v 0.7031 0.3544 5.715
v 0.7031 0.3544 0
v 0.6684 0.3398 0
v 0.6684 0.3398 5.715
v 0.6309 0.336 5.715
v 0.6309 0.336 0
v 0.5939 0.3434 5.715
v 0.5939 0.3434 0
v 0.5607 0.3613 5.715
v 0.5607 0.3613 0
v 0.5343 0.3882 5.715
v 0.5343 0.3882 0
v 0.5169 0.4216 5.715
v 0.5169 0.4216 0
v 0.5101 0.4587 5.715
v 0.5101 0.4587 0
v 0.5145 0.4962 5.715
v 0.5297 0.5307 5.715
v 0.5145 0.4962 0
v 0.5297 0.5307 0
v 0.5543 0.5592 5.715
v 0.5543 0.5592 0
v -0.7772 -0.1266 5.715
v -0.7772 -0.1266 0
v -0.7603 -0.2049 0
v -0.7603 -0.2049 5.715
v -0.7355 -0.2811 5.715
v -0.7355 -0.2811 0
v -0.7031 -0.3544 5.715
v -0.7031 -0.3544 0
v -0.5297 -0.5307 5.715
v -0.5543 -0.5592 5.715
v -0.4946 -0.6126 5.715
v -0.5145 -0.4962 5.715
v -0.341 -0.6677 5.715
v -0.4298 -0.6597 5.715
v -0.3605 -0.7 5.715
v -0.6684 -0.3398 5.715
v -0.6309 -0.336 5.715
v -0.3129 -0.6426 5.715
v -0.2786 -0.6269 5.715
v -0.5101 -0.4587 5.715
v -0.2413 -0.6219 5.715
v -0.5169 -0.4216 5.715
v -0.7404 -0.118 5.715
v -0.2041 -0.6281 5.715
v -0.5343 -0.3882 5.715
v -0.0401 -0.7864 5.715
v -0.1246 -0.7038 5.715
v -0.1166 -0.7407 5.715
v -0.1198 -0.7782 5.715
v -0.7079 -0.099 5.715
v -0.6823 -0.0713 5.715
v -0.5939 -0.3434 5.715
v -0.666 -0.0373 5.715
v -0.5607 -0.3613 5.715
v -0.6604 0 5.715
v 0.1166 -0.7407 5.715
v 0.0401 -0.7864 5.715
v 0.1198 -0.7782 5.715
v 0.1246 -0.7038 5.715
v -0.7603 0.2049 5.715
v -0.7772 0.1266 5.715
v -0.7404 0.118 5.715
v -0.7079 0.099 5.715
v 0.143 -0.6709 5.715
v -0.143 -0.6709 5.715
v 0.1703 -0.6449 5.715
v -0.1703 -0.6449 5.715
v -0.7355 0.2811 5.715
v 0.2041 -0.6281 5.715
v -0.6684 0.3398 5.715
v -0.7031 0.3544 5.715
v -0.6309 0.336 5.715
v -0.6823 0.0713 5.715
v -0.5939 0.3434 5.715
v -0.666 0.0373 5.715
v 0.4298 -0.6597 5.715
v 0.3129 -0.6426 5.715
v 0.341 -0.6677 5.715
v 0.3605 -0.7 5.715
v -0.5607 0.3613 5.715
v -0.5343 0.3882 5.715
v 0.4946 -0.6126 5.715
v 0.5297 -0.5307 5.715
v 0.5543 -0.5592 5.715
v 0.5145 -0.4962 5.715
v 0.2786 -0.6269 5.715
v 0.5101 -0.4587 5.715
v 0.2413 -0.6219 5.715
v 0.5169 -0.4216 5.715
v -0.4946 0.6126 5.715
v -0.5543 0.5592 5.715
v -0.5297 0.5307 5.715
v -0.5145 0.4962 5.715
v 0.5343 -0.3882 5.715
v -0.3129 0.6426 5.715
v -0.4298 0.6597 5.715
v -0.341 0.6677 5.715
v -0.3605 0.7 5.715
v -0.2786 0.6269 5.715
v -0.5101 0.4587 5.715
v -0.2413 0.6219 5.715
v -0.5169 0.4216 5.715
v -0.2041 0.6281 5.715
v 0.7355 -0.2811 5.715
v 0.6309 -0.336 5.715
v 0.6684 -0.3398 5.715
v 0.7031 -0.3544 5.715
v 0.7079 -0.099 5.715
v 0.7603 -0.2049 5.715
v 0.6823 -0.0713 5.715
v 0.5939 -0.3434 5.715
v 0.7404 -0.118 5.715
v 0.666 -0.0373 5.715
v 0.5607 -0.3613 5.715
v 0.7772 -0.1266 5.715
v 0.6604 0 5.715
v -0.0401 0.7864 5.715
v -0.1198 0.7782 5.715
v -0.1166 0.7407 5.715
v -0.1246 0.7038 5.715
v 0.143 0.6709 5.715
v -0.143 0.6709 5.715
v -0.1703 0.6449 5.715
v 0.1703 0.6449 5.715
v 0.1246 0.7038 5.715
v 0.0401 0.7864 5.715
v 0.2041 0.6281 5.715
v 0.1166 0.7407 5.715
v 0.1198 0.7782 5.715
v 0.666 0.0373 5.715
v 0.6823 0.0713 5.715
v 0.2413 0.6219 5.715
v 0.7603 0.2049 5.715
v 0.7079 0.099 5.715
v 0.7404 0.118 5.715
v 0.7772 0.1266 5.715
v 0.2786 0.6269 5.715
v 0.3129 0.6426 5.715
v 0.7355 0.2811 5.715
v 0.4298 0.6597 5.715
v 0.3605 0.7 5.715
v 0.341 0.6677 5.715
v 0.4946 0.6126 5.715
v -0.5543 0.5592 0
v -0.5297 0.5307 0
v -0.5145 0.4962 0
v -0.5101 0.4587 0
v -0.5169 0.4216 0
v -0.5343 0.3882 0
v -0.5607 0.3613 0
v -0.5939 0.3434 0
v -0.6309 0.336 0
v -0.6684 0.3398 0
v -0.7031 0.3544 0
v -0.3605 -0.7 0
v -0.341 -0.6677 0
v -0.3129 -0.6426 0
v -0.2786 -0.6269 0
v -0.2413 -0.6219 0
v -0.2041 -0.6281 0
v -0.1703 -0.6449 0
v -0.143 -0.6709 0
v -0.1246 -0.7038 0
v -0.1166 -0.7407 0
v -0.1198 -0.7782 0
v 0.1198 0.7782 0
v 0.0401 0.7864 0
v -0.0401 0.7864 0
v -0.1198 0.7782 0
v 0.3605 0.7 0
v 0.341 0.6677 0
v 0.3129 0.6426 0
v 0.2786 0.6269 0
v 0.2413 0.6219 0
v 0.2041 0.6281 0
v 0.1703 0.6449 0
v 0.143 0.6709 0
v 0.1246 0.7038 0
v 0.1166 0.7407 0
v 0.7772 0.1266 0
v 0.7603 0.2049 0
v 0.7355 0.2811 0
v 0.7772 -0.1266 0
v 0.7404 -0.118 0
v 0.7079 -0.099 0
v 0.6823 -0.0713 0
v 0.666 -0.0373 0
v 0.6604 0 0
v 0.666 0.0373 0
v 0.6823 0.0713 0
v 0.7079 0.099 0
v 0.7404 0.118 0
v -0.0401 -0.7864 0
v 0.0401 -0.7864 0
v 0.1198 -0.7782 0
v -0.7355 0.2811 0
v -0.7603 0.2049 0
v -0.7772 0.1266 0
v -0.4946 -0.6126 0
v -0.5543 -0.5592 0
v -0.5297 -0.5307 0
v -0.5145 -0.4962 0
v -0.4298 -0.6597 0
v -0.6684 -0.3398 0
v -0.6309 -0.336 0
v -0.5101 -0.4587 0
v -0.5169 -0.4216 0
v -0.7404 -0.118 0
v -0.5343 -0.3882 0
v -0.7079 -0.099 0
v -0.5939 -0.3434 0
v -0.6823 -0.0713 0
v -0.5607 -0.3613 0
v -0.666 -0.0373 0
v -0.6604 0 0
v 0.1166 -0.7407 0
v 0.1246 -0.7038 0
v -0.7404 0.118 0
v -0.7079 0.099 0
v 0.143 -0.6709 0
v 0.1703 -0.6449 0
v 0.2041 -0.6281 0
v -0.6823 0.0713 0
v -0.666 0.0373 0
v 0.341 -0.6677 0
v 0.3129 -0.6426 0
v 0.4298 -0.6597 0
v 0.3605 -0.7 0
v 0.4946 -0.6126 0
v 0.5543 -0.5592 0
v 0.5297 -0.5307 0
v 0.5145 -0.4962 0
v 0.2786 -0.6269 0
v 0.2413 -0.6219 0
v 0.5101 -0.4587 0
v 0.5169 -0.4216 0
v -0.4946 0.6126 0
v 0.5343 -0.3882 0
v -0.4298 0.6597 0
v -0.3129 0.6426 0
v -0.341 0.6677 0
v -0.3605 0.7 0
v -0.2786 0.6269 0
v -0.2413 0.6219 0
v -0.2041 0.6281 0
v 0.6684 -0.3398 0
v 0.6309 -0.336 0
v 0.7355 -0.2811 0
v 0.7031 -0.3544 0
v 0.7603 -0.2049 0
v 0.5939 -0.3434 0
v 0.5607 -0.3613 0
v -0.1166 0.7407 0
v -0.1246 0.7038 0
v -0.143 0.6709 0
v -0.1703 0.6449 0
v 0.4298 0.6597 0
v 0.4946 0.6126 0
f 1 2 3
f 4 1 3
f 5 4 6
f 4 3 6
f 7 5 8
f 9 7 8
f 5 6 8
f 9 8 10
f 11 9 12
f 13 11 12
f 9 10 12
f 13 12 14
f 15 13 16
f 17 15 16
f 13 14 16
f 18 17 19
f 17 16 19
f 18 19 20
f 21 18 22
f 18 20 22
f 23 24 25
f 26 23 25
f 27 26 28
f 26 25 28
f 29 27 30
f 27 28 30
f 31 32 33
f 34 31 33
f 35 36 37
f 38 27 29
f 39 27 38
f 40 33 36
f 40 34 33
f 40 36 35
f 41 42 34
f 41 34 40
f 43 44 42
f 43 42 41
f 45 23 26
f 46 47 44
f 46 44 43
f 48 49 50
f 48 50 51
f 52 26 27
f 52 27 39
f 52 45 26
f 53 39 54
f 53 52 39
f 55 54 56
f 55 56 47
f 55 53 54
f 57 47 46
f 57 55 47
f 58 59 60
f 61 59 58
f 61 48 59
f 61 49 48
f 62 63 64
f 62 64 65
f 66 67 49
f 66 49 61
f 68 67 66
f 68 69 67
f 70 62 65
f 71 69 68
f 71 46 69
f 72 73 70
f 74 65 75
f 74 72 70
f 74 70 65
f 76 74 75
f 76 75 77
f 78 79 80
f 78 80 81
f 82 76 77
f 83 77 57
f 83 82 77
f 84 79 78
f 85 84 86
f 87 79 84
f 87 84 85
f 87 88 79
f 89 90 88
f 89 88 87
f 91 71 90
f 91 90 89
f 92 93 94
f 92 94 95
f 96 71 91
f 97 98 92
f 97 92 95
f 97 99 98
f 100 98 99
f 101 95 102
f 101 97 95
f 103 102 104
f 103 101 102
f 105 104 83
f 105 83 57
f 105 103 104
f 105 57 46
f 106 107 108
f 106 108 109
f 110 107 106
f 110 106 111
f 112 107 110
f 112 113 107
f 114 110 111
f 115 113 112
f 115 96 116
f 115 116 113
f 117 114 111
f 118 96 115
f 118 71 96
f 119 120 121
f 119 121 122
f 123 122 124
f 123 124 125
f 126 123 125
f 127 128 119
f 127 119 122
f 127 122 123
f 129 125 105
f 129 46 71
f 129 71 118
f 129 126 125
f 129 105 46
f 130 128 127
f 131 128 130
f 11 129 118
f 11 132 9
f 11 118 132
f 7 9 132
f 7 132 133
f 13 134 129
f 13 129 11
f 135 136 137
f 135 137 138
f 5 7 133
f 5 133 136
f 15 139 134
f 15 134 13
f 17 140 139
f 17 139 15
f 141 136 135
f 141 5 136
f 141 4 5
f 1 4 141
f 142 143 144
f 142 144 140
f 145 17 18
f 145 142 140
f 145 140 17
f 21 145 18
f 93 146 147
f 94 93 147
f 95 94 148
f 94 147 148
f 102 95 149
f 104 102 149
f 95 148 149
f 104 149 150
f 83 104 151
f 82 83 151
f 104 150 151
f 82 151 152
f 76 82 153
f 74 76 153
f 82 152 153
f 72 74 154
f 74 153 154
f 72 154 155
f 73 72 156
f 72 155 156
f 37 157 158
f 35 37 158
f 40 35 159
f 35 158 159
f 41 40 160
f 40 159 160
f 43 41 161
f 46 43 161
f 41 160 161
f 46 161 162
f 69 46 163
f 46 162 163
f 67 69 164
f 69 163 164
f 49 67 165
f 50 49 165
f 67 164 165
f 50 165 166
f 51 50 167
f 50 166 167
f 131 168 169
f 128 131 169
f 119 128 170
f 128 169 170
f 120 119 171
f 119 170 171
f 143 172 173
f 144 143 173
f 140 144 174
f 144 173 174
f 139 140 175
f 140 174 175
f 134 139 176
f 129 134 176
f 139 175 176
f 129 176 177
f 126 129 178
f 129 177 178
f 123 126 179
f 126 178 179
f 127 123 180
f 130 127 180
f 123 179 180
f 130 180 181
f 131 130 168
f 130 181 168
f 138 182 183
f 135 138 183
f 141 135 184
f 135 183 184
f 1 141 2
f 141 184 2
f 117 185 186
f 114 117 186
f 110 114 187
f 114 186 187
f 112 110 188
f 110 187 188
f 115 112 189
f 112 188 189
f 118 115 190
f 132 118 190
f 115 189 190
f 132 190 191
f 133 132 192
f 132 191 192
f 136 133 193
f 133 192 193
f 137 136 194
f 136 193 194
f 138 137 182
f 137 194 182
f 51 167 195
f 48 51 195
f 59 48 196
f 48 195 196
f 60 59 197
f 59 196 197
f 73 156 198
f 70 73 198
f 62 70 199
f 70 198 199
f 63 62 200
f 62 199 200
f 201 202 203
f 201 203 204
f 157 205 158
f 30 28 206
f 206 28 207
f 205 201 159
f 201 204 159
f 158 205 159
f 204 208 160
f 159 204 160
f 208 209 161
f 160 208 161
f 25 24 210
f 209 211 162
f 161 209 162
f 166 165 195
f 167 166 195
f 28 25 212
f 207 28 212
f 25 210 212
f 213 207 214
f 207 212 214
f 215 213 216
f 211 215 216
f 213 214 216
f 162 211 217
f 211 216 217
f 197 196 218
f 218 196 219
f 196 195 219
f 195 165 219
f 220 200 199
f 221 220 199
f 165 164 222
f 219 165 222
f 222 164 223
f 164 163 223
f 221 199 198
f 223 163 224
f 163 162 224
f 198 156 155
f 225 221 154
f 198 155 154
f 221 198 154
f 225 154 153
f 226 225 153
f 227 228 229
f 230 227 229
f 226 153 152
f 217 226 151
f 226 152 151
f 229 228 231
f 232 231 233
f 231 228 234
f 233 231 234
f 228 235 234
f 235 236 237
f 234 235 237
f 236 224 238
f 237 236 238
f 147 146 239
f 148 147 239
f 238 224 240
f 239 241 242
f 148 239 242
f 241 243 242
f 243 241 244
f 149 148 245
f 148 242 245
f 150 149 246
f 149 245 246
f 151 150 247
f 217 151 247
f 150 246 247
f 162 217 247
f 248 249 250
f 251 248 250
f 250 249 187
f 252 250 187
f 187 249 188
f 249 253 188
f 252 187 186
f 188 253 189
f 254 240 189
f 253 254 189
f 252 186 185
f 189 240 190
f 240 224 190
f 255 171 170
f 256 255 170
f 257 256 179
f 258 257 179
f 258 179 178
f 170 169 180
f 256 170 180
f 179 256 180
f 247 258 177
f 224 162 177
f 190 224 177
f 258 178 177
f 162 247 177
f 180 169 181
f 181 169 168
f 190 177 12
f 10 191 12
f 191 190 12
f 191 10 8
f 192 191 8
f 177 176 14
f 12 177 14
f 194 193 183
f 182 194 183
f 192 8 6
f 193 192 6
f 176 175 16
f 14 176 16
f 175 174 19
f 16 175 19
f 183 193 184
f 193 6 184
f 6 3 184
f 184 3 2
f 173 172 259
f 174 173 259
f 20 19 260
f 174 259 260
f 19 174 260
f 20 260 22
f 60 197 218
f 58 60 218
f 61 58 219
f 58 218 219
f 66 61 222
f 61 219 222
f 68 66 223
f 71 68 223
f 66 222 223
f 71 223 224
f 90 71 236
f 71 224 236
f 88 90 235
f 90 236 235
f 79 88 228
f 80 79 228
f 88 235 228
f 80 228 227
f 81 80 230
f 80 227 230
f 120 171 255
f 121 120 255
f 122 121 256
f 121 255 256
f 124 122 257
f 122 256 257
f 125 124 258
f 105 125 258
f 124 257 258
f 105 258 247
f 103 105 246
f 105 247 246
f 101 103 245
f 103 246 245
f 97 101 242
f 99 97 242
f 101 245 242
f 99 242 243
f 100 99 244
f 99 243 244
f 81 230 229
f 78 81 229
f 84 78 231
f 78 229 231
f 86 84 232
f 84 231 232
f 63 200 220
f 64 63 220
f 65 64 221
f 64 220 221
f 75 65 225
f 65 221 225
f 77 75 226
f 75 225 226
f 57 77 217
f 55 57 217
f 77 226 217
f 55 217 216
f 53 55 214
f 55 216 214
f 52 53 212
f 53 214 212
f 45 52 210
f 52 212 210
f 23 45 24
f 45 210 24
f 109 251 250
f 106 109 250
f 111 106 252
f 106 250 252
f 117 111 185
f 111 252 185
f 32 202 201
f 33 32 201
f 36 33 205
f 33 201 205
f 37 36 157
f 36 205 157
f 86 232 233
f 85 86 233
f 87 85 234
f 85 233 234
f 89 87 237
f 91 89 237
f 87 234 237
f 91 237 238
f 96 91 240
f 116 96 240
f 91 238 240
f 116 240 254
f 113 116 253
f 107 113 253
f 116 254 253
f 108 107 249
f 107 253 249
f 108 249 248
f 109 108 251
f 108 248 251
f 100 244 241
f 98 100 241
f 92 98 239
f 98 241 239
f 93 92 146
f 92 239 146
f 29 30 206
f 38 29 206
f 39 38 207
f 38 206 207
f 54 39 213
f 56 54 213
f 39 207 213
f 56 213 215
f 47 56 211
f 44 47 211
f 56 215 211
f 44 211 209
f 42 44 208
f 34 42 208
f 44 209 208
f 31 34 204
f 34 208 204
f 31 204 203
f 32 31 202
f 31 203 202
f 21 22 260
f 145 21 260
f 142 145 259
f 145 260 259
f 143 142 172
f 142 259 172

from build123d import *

# Parameters (mm, degrees)
BOSS_EXTRUDE1_DEPTH = 5.715


with BuildPart() as part:
    # Sketch1 → Boss-Extrude1 (new body)
    with BuildSketch(Plane.XY):
        with BuildLine():
            ThreePointArc((-0.360545818, 0.70000391), (-0.462822108, 0.637019981), (-0.554328495, 0.559212553))
            ThreePointArc((-0.554328495, 0.559212553), (-0.534274823, 0.388173381), (-0.703139668, 0.354391545))
            ThreePointArc((-0.703139668, 0.354391545), (-0.748861901, 0.243319981), (-0.777158065, 0.126586345))
            ThreePointArc((-0.777158065, 0.126586345), (-0.6604, 0), (-0.777158065, -0.126586345))
            ThreePointArc((-0.777158065, -0.126586345), (-0.748861901, -0.243319981), (-0.703139668, -0.354391545))
            ThreePointArc((-0.703139668, -0.354391545), (-0.534274823, -0.388173381), (-0.554328495, -0.559212553))
            ThreePointArc((-0.554328495, -0.559212553), (-0.462822108, -0.637019981), (-0.360545818, -0.70000391))
            ThreePointArc((-0.360545818, -0.70000391), (-0.204074823, -0.628077723), (-0.119764281, -0.778238573))
            ThreePointArc((-0.119764281, -0.778238573), (0, -0.7874), (0.119764281, -0.778238573))
            ThreePointArc((0.119764281, -0.778238573), (0.204074823, -0.628077723), (0.360545818, -0.70000391))
            ThreePointArc((0.360545818, -0.70000391), (0.462822108, -0.637019981), (0.554328495, -0.559212553))
            ThreePointArc((0.554328495, -0.559212553), (0.534274823, -0.388173381), (0.703139668, -0.354391545))
            ThreePointArc((0.703139668, -0.354391545), (0.748861901, -0.243319981), (0.777158065, -0.126586345))
            ThreePointArc((0.777158065, -0.126586345), (0.6604, 0), (0.777158065, 0.126586345))
            ThreePointArc((0.777158065, 0.126586345), (0.748861901, 0.243319981), (0.703139668, 0.354391545))
            ThreePointArc((0.703139668, 0.354391545), (0.534274823, 0.388173381), (0.554328495, 0.559212553))
            ThreePointArc((0.554328495, 0.559212553), (0.462822108, 0.637019981), (0.360545818, 0.70000391))
            ThreePointArc((0.360545818, 0.70000391), (0.204074823, 0.628077723), (0.119764281, 0.778238573))
            ThreePointArc((0.119764281, 0.778238573), (0, 0.7874), (-0.119764281, 0.778238573))
            ThreePointArc((-0.119764281, 0.778238573), (-0.204074823, 0.628077723), (-0.360545818, 0.70000391))
        make_face()
    extrude(amount=BOSS_EXTRUDE1_DEPTH)


solid = part.part
